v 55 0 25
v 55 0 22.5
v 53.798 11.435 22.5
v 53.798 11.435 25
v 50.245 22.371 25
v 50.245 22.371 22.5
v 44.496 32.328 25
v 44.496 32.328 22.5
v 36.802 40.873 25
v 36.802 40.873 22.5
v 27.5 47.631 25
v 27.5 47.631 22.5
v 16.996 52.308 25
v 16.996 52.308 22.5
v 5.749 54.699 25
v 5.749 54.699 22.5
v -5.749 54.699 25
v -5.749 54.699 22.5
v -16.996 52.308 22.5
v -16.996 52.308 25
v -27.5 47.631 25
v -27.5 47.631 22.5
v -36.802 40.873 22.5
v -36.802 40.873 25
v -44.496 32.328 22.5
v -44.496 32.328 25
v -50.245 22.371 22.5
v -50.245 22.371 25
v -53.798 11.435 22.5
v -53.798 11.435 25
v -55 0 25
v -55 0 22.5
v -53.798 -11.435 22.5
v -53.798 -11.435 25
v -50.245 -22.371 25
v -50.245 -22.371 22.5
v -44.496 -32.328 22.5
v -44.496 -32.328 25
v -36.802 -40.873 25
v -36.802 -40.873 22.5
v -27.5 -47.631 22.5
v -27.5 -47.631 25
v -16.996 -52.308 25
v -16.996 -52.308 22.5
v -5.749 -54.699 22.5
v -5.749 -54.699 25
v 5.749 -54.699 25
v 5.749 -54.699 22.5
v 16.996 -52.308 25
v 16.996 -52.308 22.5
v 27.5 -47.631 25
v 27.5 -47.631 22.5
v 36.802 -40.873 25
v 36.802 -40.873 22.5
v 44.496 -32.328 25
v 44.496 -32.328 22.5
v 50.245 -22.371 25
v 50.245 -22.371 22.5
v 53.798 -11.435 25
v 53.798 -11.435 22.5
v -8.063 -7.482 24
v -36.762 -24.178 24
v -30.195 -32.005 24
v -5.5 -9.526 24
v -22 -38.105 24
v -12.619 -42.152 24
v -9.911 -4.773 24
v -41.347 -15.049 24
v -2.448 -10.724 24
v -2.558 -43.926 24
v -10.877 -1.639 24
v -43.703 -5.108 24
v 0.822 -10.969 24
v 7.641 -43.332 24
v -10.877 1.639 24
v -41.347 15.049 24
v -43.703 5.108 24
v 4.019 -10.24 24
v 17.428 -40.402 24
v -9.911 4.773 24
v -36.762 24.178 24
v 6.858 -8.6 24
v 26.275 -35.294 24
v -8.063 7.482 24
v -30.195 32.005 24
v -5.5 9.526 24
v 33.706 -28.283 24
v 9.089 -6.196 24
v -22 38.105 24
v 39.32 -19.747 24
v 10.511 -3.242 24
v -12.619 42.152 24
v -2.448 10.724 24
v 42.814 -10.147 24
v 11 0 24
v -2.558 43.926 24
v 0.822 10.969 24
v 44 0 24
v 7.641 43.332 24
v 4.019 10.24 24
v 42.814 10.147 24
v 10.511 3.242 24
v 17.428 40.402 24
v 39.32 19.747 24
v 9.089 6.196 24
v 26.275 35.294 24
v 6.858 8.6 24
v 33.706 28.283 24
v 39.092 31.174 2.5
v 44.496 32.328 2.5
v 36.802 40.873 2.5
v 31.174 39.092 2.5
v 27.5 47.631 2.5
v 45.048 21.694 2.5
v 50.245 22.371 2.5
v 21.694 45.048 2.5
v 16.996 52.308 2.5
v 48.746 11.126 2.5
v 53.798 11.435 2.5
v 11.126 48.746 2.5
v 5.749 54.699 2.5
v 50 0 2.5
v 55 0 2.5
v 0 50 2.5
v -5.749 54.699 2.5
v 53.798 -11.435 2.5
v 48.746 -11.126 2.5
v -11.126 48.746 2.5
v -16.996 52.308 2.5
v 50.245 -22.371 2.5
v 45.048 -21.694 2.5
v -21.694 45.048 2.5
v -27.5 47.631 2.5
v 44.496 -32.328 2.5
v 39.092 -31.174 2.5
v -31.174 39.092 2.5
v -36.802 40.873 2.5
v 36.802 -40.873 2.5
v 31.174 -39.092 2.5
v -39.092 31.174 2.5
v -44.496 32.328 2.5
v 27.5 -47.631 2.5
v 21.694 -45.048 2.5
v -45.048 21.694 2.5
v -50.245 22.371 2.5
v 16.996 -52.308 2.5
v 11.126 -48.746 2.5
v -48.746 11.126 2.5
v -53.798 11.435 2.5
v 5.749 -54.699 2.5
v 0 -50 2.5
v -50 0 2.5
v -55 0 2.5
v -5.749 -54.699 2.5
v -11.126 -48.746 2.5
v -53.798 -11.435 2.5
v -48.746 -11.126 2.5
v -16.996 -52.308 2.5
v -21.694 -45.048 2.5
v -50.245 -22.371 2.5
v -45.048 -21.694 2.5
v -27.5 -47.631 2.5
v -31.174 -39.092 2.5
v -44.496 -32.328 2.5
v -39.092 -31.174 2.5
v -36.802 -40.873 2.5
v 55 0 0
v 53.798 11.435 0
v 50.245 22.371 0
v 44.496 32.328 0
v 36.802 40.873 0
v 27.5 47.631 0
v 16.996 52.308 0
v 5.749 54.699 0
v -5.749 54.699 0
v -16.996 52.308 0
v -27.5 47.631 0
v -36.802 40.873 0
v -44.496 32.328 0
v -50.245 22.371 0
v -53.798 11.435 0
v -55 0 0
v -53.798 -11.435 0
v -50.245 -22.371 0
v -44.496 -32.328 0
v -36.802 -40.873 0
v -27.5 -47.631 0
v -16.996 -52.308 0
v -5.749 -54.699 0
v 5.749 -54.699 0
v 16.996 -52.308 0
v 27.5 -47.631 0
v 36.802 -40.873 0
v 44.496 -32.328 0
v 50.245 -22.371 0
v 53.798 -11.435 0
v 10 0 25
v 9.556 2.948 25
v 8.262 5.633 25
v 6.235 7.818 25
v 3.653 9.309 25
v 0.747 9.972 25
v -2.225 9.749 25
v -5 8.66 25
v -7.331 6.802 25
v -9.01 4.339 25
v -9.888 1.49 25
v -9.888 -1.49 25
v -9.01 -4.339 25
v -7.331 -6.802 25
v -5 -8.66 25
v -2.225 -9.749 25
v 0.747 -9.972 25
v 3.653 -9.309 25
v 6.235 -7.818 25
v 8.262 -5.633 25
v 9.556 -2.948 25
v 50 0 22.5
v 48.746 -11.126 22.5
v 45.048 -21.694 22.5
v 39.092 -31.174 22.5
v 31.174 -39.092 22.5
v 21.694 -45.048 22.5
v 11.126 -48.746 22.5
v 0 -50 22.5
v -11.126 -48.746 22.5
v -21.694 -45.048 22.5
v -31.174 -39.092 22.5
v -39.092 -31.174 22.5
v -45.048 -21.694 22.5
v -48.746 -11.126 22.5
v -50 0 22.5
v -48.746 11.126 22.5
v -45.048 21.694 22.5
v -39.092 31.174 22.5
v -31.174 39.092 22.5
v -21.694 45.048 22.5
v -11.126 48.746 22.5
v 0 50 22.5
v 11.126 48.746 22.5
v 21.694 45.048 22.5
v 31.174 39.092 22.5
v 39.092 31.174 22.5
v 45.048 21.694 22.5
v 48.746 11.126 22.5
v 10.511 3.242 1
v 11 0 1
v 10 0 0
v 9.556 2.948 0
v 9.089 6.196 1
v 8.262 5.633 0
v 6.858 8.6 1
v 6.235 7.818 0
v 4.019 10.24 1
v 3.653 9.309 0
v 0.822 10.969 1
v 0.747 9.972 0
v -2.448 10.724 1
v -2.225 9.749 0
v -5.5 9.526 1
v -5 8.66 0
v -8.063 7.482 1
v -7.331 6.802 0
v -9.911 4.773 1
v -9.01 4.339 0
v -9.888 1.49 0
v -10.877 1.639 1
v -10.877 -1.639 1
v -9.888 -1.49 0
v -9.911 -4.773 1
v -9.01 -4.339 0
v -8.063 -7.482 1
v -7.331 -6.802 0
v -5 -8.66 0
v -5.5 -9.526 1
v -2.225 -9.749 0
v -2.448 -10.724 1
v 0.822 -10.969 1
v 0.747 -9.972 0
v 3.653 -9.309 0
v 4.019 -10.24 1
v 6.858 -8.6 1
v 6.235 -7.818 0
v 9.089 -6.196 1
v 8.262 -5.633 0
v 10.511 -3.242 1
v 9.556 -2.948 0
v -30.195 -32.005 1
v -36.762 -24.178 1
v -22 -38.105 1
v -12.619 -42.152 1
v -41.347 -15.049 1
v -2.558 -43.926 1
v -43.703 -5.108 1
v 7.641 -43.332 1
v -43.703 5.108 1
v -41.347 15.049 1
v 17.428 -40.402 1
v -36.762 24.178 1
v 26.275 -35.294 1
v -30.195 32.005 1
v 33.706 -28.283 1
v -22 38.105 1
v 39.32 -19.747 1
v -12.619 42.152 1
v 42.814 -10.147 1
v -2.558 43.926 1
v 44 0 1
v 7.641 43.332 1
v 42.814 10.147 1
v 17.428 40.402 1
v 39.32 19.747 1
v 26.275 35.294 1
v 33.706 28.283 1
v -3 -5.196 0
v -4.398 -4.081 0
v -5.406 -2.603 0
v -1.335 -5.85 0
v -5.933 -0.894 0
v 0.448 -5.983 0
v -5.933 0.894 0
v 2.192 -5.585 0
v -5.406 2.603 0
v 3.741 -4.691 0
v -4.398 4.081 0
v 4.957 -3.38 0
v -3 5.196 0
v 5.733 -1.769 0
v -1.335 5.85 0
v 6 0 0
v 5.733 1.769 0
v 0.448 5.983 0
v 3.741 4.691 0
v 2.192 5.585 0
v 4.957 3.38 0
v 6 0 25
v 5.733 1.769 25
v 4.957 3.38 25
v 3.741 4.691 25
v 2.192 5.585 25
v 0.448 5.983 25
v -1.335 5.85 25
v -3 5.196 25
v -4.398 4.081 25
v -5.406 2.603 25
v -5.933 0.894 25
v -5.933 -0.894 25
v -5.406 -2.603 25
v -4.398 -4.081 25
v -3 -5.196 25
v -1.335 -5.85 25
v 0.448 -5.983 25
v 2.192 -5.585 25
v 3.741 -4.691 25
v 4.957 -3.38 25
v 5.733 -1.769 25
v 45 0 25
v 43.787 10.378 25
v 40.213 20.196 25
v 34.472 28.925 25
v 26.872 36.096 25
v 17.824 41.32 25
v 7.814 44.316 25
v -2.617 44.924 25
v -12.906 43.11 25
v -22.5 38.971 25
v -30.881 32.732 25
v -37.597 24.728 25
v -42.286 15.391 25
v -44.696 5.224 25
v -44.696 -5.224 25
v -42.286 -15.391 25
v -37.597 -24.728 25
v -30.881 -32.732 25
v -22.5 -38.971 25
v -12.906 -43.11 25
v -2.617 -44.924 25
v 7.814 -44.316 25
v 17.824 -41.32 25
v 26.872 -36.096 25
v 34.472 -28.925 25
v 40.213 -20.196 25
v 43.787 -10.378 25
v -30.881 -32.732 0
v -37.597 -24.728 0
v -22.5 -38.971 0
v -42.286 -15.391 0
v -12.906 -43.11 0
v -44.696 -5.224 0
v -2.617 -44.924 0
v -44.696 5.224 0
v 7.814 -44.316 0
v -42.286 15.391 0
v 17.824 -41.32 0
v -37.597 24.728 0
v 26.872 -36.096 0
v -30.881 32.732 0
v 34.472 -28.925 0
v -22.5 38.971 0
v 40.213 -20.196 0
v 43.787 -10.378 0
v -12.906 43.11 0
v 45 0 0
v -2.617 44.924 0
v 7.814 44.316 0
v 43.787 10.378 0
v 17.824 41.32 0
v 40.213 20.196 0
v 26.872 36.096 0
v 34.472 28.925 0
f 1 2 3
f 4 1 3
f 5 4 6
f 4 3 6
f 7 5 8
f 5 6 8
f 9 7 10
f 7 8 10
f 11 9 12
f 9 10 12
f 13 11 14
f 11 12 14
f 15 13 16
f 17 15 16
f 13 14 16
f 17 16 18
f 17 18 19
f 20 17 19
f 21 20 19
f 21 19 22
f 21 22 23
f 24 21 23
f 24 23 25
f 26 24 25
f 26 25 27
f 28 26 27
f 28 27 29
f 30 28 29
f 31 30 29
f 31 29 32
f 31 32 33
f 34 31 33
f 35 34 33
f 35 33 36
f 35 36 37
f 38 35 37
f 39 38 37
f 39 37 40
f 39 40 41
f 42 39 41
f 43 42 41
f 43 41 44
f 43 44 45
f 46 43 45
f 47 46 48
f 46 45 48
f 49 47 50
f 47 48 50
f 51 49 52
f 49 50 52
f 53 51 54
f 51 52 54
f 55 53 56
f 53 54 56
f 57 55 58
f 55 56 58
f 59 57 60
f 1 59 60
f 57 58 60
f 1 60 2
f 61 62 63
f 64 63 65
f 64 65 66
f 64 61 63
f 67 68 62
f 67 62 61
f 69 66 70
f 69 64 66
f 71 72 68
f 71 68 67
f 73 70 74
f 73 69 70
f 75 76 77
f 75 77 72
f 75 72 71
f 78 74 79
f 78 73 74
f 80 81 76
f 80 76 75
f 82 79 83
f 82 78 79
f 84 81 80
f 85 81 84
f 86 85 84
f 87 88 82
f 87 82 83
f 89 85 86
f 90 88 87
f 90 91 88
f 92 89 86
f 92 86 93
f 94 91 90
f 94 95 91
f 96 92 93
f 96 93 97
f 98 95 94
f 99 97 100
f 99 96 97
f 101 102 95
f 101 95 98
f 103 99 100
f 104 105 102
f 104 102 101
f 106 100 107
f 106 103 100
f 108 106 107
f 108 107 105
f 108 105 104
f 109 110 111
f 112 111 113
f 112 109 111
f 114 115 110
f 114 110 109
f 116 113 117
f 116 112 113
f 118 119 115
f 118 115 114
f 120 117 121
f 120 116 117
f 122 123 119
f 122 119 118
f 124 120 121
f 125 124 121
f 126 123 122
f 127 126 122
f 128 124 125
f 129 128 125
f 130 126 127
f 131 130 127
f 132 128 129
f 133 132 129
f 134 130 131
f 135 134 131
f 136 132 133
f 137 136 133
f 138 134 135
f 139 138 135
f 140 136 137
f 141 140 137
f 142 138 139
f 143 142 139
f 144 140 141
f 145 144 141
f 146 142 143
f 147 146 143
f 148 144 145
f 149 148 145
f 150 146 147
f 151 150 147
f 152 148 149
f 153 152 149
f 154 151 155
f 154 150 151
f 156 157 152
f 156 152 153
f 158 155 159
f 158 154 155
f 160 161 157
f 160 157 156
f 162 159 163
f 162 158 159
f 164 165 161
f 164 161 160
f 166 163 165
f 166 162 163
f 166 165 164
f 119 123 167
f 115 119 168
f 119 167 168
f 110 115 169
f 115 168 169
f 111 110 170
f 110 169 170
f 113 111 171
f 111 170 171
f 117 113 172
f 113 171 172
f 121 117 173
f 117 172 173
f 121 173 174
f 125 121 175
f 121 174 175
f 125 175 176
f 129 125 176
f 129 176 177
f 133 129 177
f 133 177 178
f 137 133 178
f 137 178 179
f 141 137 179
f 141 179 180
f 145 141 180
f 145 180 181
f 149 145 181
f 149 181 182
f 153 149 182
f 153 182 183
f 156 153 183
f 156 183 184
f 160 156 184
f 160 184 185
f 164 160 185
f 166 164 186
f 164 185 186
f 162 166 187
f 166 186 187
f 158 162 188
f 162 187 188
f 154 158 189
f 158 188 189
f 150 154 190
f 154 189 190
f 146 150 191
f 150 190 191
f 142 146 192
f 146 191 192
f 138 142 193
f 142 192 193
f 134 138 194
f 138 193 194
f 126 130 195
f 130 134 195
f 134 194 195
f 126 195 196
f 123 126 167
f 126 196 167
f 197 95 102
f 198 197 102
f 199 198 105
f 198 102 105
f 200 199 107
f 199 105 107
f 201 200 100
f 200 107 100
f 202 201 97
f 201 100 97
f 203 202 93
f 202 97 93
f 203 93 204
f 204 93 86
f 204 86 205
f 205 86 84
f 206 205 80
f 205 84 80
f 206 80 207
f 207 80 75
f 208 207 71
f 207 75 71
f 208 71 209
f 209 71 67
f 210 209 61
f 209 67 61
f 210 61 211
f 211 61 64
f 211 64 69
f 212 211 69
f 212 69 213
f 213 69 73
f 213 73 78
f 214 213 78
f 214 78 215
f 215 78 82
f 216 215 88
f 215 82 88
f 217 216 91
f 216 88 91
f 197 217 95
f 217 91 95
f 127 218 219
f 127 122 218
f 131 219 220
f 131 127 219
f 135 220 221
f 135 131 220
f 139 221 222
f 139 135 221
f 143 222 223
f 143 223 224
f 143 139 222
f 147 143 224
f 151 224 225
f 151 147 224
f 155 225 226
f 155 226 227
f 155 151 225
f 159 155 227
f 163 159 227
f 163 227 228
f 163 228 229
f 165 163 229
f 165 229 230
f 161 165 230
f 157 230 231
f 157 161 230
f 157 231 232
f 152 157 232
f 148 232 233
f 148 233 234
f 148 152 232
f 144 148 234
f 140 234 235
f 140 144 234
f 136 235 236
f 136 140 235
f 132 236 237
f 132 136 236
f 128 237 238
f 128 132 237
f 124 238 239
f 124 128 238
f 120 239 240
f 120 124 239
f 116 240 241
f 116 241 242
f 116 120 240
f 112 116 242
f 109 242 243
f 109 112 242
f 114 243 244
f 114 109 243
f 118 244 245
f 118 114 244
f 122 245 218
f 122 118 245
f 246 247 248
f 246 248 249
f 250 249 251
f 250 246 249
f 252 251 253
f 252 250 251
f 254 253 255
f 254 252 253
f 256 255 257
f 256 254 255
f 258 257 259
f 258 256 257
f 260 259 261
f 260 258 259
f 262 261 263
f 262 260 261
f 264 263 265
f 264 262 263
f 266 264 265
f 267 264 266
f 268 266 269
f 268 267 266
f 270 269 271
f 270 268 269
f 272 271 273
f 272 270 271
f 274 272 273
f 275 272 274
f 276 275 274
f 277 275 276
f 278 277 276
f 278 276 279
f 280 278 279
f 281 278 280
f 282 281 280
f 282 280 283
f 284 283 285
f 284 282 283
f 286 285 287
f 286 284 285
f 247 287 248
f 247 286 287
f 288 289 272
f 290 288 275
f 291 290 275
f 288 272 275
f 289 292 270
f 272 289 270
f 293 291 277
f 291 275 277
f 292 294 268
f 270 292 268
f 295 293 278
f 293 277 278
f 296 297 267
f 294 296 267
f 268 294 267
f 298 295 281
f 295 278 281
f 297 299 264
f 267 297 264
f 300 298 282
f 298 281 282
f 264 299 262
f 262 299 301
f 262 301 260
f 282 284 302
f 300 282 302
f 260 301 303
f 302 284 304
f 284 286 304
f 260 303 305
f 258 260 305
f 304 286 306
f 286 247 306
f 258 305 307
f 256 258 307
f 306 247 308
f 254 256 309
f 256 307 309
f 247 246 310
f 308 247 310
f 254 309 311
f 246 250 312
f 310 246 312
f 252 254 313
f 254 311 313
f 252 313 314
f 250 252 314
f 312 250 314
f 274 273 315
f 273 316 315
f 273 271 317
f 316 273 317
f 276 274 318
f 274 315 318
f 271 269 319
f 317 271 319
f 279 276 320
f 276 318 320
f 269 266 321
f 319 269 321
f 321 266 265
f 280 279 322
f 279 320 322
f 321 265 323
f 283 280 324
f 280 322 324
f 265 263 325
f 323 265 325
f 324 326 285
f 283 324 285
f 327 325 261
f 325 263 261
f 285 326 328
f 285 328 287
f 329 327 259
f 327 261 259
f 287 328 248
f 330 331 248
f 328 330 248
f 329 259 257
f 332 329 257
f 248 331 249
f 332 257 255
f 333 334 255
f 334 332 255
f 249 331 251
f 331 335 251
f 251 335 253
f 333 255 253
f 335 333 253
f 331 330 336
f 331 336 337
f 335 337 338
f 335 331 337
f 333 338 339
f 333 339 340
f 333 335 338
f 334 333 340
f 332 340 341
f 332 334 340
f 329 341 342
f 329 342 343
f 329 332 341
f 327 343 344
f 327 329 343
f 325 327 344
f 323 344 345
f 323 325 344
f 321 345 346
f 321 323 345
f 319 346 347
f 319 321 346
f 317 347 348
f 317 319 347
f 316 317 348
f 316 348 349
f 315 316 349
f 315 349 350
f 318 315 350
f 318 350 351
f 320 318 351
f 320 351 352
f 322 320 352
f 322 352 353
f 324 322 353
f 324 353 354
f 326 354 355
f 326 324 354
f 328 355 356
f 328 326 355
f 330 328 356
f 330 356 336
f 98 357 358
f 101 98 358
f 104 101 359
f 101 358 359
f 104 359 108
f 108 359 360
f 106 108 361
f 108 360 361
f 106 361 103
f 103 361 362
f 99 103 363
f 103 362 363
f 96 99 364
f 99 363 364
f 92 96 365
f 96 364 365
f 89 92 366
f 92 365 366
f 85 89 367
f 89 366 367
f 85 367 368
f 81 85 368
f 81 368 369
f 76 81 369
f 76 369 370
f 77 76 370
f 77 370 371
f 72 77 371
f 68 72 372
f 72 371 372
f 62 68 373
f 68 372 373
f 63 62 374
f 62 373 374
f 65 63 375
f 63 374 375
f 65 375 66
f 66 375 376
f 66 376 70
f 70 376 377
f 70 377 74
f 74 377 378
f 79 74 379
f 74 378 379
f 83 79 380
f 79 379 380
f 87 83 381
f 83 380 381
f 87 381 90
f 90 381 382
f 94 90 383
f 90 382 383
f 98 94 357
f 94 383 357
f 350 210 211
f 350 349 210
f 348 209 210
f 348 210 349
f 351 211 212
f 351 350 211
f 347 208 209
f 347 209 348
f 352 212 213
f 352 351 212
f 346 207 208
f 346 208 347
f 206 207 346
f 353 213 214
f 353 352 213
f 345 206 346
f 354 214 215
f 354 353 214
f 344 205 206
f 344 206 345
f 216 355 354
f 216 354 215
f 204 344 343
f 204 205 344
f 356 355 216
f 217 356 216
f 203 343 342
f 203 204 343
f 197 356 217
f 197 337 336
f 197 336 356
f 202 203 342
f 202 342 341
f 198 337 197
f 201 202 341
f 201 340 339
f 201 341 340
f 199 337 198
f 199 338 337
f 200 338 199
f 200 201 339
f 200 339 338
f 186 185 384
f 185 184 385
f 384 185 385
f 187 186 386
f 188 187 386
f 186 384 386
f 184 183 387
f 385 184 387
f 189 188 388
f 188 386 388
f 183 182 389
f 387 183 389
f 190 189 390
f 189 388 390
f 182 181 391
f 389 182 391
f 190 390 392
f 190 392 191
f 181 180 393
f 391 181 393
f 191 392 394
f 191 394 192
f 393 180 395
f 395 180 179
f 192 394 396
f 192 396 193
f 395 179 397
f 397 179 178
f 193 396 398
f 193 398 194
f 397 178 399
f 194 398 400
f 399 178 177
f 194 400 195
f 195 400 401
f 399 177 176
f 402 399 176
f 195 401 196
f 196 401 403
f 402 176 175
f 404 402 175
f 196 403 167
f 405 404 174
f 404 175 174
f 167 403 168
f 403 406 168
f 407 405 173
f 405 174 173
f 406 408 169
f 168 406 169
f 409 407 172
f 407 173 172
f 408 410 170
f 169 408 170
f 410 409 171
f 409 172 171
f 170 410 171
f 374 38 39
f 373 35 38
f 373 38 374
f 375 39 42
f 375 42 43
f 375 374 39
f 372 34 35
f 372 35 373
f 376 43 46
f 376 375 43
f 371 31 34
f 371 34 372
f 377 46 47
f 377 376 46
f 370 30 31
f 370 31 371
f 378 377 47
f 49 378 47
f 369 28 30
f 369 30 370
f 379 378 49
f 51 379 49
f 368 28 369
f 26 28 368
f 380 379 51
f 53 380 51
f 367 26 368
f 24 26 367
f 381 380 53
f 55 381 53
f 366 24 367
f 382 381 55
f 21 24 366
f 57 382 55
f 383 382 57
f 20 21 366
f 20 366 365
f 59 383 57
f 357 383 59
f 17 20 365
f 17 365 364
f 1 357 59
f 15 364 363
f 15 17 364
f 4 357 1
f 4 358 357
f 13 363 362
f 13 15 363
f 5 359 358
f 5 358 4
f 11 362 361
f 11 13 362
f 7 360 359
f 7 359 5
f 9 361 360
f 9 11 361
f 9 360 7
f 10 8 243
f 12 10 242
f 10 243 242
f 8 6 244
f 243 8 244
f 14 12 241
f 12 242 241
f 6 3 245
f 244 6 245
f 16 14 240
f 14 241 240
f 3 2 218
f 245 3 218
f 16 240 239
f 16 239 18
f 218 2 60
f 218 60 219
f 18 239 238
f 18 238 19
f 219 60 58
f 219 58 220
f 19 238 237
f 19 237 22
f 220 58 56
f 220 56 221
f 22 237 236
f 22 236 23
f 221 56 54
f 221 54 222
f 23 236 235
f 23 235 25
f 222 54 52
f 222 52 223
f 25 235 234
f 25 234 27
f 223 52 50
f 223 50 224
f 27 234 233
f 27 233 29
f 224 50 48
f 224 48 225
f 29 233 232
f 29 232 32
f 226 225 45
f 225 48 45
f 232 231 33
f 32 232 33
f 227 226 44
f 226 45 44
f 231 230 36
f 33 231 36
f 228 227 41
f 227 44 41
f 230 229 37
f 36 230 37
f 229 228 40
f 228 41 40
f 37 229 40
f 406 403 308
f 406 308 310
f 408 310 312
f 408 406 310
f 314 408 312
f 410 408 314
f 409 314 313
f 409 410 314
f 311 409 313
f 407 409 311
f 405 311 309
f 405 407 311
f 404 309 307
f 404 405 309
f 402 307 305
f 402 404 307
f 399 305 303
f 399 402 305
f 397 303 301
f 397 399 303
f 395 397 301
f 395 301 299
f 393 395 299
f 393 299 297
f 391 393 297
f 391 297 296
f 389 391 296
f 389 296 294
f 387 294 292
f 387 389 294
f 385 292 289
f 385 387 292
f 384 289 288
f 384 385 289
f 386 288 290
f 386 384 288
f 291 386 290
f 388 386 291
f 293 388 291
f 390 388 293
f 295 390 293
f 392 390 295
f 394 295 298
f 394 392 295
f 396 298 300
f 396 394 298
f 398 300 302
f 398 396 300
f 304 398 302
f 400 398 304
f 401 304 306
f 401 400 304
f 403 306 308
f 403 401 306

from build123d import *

# Parameters (mm, degrees)
CROQUIS1_R                 = 55
CROQUIS1_R_2               = 6
SALIENTE_EXTRUIR1_DEPTH    = 25
CROQUIS3_W                 = 20
CROQUIS3_H                 = 10
CROQUIS4_R                 = 45
CROQUIS4_R_2               = 10
CORTAR_EXTRUIR1_DEPTH      = 1
CHAFL_N1_SIZE              = 1
CHAFL_N1_OF_SIMETR_A2_SIZE = 1


with BuildPart() as part:
    # Croquis1 → Saliente-Extruir1 (new body)
    with BuildSketch(Plane.XY):
        Circle(CROQUIS1_R)
        Circle(CROQUIS1_R_2, mode=Mode.SUBTRACT)
    extrude(amount=SALIENTE_EXTRUIR1_DEPTH)

    # Croquis3 → Cortar-Revolución1 (revolve, cut)
    with BuildSketch(Plane(origin=(0, 0, 0), x_dir=(0, 0, -1), z_dir=(1, 0, 0)), mode=Mode.PRIVATE) as cortar_revoluci_n1_sk:
        with Locations((-12.5, 55)):
            Rectangle(CROQUIS3_W, CROQUIS3_H)
    revolve(cortar_revoluci_n1_sk.sketch.rotate(Axis((0, 0, 25), (0, 0, -1)), 90), axis=Axis((0, 0, 25), (0, 0, -1)), mode=Mode.SUBTRACT)

    # Croquis4 → Cortar-Extruir1 (cut)
    with BuildSketch(Plane.XY.offset(25)):
        Circle(CROQUIS4_R)
        Circle(CROQUIS4_R_2, mode=Mode.SUBTRACT)
    cortar_extruir1 = extrude(amount=-CORTAR_EXTRUIR1_DEPTH, mode=Mode.SUBTRACT)

    # Chaflán1
    chafl_n1_edges = [part.edges().sort_by_distance(p)[0] for p in [
        (-45, 0, 24),
        (-10, 0, 24),
    ]]
    chamfer(chafl_n1_edges, length=CHAFL_N1_SIZE - 0.0001)  # a hair under: the kernel refuses the full size

    # Simetría2: Cortar-Extruir1 across plane
    add(cortar_extruir1.mirror(Plane.XY.offset(12.5)), mode=Mode.SUBTRACT)

    # Chaflán1 of Simetría2
    chafl_n1_of_simetr_a2_edges = [part.edges().sort_by_distance(p)[0] for p in [
        (-45, 0, 1),
        (-10, 0, 1),
    ]]
    chamfer(chafl_n1_of_simetr_a2_edges, length=CHAFL_N1_OF_SIMETR_A2_SIZE - 0.0001)  # a hair under: the kernel refuses the full size


solid = part.part
